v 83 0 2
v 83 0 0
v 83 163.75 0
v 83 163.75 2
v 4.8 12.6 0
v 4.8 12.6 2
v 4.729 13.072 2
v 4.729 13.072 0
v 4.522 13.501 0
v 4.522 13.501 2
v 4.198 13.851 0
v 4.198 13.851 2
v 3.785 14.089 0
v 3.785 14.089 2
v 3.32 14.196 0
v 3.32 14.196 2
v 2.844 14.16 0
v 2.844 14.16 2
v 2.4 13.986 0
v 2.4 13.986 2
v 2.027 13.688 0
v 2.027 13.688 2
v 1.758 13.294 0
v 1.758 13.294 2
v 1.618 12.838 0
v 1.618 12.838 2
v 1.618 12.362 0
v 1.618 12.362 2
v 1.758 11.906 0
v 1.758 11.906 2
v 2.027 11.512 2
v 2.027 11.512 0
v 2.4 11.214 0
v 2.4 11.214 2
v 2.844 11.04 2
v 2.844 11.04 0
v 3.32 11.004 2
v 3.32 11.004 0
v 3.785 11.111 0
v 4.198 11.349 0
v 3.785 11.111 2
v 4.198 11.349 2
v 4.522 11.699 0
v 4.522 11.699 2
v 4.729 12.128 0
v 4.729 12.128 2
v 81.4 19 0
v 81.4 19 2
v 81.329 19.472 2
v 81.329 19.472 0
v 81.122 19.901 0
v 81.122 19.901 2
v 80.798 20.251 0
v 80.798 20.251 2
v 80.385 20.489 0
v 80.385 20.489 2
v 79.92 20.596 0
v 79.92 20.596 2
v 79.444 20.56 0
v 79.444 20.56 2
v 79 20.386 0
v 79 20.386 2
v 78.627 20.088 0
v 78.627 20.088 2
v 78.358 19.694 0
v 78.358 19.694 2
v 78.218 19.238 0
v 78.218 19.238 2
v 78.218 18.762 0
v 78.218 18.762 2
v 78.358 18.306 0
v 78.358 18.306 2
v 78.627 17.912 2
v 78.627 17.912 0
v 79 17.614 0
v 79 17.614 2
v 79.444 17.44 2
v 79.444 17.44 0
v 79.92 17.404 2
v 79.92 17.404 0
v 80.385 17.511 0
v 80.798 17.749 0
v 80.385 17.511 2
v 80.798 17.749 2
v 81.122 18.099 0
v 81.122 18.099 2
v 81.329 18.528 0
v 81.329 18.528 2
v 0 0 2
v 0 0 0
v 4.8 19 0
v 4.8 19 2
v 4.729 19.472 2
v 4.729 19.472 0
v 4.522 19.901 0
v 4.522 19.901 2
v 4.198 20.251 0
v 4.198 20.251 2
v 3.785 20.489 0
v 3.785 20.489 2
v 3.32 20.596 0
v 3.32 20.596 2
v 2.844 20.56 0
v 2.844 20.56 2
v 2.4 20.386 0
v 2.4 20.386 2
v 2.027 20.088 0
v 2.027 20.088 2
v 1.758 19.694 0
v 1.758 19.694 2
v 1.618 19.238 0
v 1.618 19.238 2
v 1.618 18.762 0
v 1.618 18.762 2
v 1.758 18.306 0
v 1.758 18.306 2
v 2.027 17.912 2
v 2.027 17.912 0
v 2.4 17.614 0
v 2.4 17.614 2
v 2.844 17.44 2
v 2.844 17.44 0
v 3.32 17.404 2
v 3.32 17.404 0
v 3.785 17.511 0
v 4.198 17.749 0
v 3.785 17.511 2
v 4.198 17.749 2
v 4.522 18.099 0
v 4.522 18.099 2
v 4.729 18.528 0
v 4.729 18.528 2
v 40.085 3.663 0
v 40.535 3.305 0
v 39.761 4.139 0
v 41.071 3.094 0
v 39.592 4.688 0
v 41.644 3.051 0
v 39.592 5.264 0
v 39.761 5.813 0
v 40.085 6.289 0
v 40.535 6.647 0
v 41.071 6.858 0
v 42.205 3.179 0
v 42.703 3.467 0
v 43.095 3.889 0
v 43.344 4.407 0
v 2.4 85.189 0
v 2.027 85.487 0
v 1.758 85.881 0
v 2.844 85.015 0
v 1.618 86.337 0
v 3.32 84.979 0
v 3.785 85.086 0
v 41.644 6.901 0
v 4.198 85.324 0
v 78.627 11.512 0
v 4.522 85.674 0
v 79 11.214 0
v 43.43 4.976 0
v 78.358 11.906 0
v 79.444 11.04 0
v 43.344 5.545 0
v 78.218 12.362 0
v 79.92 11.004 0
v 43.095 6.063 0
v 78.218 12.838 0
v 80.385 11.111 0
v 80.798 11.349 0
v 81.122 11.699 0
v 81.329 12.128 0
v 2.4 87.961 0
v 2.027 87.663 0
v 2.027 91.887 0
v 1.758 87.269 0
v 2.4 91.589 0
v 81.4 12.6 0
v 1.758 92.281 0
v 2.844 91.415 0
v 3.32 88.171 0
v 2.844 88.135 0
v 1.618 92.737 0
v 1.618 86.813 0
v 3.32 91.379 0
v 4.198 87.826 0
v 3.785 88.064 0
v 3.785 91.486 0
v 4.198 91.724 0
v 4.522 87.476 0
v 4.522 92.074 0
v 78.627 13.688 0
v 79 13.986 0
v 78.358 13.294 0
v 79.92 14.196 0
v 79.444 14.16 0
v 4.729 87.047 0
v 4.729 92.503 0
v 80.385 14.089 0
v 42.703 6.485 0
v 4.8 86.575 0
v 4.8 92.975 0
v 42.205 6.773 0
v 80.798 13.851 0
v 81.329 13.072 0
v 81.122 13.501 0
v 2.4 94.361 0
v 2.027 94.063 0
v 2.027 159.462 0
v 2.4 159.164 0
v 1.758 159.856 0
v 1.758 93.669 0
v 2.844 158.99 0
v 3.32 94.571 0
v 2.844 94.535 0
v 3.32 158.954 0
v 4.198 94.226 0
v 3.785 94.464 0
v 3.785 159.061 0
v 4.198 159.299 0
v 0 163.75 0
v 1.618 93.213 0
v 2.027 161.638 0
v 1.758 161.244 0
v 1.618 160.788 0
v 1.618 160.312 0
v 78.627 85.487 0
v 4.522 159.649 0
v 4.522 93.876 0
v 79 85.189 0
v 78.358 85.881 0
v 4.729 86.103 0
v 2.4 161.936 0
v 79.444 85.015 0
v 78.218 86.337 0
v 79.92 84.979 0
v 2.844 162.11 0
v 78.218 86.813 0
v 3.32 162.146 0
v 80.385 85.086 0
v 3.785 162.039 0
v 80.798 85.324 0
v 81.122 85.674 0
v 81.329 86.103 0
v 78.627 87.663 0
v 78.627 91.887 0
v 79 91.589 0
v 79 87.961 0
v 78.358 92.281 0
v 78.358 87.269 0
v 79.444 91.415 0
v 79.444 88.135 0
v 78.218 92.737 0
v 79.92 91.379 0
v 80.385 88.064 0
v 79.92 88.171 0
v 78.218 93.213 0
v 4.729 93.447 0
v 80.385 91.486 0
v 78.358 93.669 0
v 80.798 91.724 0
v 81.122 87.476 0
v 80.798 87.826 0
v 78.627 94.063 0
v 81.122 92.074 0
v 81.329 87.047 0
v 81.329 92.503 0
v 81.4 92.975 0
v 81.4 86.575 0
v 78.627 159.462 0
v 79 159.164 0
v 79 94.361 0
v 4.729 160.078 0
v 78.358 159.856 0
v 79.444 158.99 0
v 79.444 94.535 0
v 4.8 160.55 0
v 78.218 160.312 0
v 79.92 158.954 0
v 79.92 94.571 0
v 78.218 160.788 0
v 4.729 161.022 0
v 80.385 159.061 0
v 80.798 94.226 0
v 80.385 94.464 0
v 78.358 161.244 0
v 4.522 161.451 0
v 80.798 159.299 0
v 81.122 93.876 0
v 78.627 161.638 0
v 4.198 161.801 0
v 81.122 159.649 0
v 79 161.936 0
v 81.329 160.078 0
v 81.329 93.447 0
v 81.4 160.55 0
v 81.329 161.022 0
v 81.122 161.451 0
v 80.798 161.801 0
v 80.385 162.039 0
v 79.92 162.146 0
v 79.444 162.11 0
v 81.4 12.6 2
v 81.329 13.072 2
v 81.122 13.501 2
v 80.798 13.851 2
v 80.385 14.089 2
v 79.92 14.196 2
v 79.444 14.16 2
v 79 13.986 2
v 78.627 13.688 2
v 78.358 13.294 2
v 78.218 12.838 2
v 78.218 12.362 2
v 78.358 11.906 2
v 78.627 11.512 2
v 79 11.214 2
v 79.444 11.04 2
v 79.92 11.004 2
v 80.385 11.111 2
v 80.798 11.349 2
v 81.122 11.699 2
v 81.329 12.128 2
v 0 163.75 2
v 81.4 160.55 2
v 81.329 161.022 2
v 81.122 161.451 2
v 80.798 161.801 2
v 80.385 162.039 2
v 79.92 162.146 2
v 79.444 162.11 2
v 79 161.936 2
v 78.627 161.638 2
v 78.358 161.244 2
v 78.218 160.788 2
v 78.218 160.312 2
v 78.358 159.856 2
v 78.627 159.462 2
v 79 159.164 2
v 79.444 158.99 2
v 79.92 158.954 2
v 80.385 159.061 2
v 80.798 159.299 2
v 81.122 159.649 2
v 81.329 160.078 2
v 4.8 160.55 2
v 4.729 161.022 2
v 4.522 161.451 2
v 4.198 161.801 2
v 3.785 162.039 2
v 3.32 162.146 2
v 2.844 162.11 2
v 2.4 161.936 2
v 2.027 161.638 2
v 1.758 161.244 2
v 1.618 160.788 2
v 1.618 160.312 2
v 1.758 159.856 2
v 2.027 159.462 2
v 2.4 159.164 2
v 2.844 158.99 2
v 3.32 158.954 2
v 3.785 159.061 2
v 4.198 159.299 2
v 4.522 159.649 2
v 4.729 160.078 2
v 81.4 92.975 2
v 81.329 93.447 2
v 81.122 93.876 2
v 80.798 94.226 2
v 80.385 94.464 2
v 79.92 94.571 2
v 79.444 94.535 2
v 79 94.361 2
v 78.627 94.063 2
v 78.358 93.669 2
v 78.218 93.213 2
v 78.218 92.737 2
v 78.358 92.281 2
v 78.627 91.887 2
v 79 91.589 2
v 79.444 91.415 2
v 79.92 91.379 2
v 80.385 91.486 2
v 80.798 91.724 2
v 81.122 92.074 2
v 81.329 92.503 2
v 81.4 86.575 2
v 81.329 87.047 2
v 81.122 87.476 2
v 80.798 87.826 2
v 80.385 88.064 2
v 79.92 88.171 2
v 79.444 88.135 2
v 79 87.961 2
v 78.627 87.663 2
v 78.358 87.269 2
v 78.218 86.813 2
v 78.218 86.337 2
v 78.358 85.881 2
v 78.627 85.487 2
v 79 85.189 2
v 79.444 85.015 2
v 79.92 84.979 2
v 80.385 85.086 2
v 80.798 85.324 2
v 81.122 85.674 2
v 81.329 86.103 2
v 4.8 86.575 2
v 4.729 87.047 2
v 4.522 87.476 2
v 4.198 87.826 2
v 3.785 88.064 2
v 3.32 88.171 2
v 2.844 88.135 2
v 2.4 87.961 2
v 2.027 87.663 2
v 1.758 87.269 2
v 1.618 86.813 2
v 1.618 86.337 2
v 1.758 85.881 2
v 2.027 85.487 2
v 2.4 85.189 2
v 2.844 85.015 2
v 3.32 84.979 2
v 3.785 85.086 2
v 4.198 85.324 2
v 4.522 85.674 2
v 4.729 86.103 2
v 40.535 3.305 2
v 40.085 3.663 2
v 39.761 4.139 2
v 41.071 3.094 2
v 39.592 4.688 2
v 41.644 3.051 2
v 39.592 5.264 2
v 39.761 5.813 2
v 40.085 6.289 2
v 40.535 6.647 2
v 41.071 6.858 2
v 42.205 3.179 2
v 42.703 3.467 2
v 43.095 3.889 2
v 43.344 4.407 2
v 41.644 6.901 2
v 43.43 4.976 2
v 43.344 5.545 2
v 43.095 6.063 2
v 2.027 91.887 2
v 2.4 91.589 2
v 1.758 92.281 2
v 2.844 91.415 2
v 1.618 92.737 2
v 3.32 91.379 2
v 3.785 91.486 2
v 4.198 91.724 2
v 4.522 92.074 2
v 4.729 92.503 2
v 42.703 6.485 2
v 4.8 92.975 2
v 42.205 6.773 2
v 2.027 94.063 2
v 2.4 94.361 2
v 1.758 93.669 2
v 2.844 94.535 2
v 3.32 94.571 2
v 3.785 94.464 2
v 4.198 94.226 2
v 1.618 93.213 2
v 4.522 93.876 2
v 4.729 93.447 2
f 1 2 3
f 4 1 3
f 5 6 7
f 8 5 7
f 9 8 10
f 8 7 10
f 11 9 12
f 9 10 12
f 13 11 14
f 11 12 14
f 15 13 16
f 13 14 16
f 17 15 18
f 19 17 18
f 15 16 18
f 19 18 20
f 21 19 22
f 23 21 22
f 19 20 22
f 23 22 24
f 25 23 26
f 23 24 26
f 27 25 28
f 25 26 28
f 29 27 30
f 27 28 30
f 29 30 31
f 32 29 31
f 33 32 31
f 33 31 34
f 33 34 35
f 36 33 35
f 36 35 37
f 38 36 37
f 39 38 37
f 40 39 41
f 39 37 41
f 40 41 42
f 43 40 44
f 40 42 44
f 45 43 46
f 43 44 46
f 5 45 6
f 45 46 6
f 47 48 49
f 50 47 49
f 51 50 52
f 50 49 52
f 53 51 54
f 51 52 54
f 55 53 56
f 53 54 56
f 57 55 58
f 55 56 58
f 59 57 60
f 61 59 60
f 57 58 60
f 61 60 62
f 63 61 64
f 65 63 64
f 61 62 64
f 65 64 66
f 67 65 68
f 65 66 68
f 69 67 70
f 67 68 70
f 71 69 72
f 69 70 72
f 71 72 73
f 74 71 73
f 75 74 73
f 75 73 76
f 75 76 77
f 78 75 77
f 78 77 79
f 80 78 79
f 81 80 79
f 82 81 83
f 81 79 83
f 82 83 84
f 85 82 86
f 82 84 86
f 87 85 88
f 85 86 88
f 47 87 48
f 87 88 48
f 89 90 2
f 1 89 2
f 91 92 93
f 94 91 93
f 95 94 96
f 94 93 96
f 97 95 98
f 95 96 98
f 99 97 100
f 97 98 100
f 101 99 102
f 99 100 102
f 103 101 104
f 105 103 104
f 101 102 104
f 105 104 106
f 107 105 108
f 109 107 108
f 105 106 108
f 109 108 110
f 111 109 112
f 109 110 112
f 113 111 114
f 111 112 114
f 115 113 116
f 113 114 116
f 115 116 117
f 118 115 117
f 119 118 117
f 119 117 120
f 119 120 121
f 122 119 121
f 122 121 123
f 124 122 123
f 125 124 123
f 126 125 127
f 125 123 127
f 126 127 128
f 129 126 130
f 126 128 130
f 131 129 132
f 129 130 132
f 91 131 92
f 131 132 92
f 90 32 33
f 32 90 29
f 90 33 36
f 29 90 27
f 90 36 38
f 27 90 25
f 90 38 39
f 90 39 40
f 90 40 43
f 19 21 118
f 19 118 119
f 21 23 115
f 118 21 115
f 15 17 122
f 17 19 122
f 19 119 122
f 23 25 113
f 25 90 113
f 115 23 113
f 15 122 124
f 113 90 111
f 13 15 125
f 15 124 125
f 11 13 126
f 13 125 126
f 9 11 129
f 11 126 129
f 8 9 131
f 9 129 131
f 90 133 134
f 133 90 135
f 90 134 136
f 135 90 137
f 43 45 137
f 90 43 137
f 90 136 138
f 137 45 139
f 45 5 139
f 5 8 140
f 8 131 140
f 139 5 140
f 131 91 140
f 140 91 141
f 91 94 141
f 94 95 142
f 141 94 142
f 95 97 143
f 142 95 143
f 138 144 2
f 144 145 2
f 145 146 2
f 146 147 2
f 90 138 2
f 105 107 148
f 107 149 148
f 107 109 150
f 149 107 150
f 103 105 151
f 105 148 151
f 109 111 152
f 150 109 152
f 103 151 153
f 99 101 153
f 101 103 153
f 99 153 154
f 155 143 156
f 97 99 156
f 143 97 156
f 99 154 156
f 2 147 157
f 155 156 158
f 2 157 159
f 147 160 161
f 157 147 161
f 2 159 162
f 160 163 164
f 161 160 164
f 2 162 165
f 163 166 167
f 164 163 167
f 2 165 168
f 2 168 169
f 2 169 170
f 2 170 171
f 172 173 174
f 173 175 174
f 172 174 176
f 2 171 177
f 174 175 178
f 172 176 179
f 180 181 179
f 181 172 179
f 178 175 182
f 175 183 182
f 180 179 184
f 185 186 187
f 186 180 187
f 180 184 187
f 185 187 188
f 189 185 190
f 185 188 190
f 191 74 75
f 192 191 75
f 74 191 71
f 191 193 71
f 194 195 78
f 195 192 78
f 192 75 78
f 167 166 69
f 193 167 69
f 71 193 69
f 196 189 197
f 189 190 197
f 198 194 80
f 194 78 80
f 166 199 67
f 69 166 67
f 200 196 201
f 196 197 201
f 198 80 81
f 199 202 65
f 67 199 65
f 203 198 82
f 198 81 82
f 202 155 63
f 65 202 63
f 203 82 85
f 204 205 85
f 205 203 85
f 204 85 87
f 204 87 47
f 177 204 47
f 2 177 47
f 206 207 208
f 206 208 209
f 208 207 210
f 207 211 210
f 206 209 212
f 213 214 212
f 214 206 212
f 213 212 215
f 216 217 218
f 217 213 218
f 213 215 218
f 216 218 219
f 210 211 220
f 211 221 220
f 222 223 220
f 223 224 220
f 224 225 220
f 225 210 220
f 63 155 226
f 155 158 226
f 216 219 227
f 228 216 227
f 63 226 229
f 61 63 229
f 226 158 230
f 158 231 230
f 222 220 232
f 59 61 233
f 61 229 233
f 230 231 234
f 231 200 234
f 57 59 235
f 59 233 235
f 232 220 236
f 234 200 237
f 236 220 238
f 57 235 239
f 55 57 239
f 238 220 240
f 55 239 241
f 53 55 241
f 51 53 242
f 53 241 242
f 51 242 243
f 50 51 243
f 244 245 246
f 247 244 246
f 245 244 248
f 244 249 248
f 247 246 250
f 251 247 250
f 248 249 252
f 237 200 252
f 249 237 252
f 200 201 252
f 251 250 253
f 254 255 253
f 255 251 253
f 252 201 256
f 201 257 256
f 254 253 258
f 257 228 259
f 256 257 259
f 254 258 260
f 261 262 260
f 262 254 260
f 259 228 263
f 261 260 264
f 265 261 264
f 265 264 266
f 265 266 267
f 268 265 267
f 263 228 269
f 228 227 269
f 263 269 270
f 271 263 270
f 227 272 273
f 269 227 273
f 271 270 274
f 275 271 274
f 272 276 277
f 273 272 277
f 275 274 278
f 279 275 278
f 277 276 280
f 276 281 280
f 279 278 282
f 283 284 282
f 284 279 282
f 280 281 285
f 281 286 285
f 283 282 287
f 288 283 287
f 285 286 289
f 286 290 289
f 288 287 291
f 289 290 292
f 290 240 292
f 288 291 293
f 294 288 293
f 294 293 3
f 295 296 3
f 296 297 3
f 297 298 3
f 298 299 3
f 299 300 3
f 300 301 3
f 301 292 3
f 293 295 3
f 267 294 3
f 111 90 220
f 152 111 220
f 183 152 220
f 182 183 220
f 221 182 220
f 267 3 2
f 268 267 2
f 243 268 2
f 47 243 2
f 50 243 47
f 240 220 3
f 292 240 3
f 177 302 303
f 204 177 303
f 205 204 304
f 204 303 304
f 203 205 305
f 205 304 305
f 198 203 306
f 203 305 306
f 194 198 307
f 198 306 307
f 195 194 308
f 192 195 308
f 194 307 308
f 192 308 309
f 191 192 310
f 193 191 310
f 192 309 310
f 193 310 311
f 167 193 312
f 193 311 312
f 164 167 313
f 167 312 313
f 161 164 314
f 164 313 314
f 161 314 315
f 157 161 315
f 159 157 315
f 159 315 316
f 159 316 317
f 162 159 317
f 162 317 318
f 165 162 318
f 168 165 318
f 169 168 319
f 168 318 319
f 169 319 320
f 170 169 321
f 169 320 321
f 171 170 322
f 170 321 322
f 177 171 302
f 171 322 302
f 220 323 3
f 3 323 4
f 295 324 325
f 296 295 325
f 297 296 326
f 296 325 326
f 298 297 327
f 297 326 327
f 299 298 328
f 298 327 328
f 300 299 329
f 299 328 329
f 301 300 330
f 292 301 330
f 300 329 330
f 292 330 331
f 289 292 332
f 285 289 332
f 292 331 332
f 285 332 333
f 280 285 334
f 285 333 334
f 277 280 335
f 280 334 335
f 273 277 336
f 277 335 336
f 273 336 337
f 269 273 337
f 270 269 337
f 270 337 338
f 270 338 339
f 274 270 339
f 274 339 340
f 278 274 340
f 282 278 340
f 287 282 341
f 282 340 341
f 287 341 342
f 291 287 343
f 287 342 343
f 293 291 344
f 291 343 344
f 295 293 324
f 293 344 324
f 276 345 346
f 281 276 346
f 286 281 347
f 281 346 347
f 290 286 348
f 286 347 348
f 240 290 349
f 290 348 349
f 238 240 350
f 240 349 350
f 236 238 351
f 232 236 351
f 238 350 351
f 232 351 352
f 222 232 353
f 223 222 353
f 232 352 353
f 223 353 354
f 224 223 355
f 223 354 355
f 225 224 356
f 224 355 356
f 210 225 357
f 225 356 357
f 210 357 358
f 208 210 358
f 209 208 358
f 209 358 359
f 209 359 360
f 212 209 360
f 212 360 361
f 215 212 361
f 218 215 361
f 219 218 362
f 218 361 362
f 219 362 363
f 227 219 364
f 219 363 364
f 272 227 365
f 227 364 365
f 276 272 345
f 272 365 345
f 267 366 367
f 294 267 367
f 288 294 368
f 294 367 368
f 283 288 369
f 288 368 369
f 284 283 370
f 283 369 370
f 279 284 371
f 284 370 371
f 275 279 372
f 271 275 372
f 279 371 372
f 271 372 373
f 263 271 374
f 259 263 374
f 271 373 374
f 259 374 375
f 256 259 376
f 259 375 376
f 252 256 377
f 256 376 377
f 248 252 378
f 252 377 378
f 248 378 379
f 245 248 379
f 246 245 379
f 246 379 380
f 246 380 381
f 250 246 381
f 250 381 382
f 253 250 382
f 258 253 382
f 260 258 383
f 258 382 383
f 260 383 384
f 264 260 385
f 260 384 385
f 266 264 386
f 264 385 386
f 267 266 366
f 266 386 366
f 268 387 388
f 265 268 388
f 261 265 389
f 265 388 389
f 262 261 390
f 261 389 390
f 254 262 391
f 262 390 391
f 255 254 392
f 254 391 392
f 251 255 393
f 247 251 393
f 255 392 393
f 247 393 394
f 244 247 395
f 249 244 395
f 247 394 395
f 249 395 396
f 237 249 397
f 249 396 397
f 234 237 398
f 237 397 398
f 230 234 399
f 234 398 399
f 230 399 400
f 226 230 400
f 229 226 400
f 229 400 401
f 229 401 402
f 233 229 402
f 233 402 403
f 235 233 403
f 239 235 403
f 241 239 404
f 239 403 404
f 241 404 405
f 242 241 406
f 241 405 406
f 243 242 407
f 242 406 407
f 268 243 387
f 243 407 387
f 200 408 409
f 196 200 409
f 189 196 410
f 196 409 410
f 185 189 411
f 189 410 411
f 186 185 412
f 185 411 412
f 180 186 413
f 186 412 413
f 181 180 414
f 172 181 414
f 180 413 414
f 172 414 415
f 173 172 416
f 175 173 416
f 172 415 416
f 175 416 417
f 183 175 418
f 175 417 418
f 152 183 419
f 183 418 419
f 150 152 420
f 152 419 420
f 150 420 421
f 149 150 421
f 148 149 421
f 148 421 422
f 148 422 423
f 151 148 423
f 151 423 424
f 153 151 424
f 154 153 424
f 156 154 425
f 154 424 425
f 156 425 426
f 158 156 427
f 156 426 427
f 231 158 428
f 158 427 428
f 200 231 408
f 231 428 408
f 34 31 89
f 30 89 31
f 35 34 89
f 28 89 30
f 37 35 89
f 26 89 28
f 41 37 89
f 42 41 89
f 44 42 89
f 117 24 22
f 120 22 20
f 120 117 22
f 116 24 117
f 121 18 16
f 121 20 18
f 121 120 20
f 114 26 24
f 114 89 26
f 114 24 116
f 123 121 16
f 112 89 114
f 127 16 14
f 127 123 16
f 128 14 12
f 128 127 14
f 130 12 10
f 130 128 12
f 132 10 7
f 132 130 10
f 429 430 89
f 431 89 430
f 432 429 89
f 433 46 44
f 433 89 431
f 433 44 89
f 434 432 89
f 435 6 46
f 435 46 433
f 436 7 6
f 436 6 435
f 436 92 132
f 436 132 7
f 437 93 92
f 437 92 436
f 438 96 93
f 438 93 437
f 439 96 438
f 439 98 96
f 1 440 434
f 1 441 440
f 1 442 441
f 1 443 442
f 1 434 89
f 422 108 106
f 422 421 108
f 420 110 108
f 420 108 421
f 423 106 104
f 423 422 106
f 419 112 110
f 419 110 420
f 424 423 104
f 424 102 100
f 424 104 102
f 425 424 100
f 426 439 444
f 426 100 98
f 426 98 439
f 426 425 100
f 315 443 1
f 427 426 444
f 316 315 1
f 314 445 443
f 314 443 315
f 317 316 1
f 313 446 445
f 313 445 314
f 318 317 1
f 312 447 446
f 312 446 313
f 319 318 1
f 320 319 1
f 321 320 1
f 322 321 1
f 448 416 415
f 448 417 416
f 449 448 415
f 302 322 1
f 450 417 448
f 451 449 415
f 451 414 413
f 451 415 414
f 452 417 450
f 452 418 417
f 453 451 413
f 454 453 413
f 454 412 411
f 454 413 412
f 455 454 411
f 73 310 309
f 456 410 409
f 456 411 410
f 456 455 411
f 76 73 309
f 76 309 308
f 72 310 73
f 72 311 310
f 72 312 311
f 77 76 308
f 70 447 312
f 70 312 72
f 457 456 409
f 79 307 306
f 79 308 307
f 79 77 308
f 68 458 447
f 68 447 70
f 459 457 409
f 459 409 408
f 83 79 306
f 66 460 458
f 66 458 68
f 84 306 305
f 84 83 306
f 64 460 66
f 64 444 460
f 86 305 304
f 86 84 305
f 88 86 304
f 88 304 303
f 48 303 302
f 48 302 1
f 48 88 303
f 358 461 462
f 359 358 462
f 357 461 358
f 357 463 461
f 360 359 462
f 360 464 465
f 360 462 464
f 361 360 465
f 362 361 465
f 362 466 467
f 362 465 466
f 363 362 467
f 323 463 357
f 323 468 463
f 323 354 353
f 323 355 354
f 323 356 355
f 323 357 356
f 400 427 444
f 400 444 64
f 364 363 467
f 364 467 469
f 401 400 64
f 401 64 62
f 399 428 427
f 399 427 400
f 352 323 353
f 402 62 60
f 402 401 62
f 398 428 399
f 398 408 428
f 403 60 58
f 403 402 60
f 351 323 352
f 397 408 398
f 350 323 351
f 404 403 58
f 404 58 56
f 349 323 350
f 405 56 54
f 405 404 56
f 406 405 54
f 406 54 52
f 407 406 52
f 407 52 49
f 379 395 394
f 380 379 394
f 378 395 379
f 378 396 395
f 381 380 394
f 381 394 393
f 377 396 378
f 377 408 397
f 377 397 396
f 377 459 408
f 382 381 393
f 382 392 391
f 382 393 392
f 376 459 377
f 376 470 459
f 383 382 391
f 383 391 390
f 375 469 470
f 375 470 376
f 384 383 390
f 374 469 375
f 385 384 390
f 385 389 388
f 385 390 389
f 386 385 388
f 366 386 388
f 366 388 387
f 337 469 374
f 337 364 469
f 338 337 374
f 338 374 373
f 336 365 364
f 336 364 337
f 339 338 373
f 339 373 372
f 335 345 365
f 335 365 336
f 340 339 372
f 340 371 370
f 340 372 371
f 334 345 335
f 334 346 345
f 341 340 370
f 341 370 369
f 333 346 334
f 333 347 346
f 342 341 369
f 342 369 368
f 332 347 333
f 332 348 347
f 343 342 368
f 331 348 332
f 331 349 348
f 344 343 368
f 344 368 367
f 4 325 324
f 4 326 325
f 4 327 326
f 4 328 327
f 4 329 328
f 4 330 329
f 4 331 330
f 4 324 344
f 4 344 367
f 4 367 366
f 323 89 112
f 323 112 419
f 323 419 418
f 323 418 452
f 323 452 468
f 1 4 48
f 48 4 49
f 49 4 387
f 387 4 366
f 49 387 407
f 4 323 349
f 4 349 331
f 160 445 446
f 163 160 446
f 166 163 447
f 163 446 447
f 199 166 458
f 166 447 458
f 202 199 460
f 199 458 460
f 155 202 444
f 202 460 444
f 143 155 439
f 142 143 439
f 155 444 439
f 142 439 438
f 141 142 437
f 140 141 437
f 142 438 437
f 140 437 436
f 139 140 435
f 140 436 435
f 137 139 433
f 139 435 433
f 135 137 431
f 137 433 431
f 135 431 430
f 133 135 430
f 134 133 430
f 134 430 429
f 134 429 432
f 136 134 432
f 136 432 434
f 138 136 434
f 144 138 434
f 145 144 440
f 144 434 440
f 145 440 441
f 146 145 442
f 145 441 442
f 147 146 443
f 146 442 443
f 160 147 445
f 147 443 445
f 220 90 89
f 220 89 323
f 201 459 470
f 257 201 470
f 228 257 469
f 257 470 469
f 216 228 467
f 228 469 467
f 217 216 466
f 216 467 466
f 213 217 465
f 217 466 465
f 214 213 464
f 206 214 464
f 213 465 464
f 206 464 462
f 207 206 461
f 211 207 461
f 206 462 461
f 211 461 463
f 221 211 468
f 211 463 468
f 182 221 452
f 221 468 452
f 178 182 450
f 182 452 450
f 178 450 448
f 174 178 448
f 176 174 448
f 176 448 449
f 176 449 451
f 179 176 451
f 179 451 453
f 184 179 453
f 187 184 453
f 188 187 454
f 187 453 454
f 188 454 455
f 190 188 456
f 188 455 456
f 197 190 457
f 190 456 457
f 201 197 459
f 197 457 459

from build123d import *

# Parameters (mm, degrees)
SKETCH1_W           = 83
SKETCH1_H           = 327.5
BOSS_EXTRUDE1_DEPTH = 2
SKETCH2_R           = 1.6
CUT_EXTRUDE1_DEPTH  = 2
SKETCH3_R           = 1.93
CUT_EXTRUDE2_DEPTH  = 2
SKETCH4_W           = 116.407651787
SKETCH4_H           = 181.18090695
CUT_EXTRUDE3_DEPTH  = 10


with BuildPart() as part:
    # Sketch1 → Boss-Extrude1 (new body)
    with BuildSketch(Plane.XY):
        with Locations((41.5, 163.75)):
            Rectangle(SKETCH1_W, SKETCH1_H)
    extrude(amount=BOSS_EXTRUDE1_DEPTH)

    # Sketch2 → Cut-Extrude1 (cut)
    with BuildSketch(Plane.XY.offset(2)):
        with Locations((3.2, 314.9)):
            Circle(SKETCH2_R)
        with Locations((3.2, 308.5)):
            Circle(SKETCH2_R)
        with Locations((79.8, 314.9)):
            Circle(SKETCH2_R)
        with Locations((79.8, 308.5)):
            Circle(SKETCH2_R)
        with Locations((3.2, 240.925)):
            Circle(SKETCH2_R)
        with Locations((3.2, 234.525)):
            Circle(SKETCH2_R)
        with Locations((79.8, 240.925)):
            Circle(SKETCH2_R)
        with Locations((79.8, 234.525)):
            Circle(SKETCH2_R)
        with Locations((3.2, 166.95)):
            Circle(SKETCH2_R)
        with Locations((3.2, 160.55)):
            Circle(SKETCH2_R)
        with Locations((79.8, 166.95)):
            Circle(SKETCH2_R)
        with Locations((79.8, 160.55)):
            Circle(SKETCH2_R)
        with Locations((3.2, 92.975)):
            Circle(SKETCH2_R)
        with Locations((3.2, 86.575)):
            Circle(SKETCH2_R)
        with Locations((79.8, 92.975)):
            Circle(SKETCH2_R)
        with Locations((79.8, 86.575)):
            Circle(SKETCH2_R)
        with Locations((3.2, 19)):
            Circle(SKETCH2_R)
        with Locations((3.2, 12.6)):
            Circle(SKETCH2_R)
        with Locations((79.8, 19)):
            Circle(SKETCH2_R)
        with Locations((79.8, 12.6)):
            Circle(SKETCH2_R)
    extrude(amount=-CUT_EXTRUDE1_DEPTH, mode=Mode.SUBTRACT)

    # Sketch3 → Cut-Extrude2 (cut)
    with BuildSketch(Plane.XY.offset(2)):
        with Locations((41.5, 322.524)):
            Circle(SKETCH3_R)
        with Locations((41.5, 4.976)):
            Circle(SKETCH3_R)
    extrude(amount=-CUT_EXTRUDE2_DEPTH, mode=Mode.SUBTRACT)

    # Sketch4 → Cut-Extrude3 (cut)
    with BuildSketch(Plane.XY.offset(2)):
        with Locations((24.796174107, 254.340453475)):
            Rectangle(SKETCH4_W, SKETCH4_H)
    extrude(amount=-CUT_EXTRUDE3_DEPTH, mode=Mode.SUBTRACT)


solid = part.part
